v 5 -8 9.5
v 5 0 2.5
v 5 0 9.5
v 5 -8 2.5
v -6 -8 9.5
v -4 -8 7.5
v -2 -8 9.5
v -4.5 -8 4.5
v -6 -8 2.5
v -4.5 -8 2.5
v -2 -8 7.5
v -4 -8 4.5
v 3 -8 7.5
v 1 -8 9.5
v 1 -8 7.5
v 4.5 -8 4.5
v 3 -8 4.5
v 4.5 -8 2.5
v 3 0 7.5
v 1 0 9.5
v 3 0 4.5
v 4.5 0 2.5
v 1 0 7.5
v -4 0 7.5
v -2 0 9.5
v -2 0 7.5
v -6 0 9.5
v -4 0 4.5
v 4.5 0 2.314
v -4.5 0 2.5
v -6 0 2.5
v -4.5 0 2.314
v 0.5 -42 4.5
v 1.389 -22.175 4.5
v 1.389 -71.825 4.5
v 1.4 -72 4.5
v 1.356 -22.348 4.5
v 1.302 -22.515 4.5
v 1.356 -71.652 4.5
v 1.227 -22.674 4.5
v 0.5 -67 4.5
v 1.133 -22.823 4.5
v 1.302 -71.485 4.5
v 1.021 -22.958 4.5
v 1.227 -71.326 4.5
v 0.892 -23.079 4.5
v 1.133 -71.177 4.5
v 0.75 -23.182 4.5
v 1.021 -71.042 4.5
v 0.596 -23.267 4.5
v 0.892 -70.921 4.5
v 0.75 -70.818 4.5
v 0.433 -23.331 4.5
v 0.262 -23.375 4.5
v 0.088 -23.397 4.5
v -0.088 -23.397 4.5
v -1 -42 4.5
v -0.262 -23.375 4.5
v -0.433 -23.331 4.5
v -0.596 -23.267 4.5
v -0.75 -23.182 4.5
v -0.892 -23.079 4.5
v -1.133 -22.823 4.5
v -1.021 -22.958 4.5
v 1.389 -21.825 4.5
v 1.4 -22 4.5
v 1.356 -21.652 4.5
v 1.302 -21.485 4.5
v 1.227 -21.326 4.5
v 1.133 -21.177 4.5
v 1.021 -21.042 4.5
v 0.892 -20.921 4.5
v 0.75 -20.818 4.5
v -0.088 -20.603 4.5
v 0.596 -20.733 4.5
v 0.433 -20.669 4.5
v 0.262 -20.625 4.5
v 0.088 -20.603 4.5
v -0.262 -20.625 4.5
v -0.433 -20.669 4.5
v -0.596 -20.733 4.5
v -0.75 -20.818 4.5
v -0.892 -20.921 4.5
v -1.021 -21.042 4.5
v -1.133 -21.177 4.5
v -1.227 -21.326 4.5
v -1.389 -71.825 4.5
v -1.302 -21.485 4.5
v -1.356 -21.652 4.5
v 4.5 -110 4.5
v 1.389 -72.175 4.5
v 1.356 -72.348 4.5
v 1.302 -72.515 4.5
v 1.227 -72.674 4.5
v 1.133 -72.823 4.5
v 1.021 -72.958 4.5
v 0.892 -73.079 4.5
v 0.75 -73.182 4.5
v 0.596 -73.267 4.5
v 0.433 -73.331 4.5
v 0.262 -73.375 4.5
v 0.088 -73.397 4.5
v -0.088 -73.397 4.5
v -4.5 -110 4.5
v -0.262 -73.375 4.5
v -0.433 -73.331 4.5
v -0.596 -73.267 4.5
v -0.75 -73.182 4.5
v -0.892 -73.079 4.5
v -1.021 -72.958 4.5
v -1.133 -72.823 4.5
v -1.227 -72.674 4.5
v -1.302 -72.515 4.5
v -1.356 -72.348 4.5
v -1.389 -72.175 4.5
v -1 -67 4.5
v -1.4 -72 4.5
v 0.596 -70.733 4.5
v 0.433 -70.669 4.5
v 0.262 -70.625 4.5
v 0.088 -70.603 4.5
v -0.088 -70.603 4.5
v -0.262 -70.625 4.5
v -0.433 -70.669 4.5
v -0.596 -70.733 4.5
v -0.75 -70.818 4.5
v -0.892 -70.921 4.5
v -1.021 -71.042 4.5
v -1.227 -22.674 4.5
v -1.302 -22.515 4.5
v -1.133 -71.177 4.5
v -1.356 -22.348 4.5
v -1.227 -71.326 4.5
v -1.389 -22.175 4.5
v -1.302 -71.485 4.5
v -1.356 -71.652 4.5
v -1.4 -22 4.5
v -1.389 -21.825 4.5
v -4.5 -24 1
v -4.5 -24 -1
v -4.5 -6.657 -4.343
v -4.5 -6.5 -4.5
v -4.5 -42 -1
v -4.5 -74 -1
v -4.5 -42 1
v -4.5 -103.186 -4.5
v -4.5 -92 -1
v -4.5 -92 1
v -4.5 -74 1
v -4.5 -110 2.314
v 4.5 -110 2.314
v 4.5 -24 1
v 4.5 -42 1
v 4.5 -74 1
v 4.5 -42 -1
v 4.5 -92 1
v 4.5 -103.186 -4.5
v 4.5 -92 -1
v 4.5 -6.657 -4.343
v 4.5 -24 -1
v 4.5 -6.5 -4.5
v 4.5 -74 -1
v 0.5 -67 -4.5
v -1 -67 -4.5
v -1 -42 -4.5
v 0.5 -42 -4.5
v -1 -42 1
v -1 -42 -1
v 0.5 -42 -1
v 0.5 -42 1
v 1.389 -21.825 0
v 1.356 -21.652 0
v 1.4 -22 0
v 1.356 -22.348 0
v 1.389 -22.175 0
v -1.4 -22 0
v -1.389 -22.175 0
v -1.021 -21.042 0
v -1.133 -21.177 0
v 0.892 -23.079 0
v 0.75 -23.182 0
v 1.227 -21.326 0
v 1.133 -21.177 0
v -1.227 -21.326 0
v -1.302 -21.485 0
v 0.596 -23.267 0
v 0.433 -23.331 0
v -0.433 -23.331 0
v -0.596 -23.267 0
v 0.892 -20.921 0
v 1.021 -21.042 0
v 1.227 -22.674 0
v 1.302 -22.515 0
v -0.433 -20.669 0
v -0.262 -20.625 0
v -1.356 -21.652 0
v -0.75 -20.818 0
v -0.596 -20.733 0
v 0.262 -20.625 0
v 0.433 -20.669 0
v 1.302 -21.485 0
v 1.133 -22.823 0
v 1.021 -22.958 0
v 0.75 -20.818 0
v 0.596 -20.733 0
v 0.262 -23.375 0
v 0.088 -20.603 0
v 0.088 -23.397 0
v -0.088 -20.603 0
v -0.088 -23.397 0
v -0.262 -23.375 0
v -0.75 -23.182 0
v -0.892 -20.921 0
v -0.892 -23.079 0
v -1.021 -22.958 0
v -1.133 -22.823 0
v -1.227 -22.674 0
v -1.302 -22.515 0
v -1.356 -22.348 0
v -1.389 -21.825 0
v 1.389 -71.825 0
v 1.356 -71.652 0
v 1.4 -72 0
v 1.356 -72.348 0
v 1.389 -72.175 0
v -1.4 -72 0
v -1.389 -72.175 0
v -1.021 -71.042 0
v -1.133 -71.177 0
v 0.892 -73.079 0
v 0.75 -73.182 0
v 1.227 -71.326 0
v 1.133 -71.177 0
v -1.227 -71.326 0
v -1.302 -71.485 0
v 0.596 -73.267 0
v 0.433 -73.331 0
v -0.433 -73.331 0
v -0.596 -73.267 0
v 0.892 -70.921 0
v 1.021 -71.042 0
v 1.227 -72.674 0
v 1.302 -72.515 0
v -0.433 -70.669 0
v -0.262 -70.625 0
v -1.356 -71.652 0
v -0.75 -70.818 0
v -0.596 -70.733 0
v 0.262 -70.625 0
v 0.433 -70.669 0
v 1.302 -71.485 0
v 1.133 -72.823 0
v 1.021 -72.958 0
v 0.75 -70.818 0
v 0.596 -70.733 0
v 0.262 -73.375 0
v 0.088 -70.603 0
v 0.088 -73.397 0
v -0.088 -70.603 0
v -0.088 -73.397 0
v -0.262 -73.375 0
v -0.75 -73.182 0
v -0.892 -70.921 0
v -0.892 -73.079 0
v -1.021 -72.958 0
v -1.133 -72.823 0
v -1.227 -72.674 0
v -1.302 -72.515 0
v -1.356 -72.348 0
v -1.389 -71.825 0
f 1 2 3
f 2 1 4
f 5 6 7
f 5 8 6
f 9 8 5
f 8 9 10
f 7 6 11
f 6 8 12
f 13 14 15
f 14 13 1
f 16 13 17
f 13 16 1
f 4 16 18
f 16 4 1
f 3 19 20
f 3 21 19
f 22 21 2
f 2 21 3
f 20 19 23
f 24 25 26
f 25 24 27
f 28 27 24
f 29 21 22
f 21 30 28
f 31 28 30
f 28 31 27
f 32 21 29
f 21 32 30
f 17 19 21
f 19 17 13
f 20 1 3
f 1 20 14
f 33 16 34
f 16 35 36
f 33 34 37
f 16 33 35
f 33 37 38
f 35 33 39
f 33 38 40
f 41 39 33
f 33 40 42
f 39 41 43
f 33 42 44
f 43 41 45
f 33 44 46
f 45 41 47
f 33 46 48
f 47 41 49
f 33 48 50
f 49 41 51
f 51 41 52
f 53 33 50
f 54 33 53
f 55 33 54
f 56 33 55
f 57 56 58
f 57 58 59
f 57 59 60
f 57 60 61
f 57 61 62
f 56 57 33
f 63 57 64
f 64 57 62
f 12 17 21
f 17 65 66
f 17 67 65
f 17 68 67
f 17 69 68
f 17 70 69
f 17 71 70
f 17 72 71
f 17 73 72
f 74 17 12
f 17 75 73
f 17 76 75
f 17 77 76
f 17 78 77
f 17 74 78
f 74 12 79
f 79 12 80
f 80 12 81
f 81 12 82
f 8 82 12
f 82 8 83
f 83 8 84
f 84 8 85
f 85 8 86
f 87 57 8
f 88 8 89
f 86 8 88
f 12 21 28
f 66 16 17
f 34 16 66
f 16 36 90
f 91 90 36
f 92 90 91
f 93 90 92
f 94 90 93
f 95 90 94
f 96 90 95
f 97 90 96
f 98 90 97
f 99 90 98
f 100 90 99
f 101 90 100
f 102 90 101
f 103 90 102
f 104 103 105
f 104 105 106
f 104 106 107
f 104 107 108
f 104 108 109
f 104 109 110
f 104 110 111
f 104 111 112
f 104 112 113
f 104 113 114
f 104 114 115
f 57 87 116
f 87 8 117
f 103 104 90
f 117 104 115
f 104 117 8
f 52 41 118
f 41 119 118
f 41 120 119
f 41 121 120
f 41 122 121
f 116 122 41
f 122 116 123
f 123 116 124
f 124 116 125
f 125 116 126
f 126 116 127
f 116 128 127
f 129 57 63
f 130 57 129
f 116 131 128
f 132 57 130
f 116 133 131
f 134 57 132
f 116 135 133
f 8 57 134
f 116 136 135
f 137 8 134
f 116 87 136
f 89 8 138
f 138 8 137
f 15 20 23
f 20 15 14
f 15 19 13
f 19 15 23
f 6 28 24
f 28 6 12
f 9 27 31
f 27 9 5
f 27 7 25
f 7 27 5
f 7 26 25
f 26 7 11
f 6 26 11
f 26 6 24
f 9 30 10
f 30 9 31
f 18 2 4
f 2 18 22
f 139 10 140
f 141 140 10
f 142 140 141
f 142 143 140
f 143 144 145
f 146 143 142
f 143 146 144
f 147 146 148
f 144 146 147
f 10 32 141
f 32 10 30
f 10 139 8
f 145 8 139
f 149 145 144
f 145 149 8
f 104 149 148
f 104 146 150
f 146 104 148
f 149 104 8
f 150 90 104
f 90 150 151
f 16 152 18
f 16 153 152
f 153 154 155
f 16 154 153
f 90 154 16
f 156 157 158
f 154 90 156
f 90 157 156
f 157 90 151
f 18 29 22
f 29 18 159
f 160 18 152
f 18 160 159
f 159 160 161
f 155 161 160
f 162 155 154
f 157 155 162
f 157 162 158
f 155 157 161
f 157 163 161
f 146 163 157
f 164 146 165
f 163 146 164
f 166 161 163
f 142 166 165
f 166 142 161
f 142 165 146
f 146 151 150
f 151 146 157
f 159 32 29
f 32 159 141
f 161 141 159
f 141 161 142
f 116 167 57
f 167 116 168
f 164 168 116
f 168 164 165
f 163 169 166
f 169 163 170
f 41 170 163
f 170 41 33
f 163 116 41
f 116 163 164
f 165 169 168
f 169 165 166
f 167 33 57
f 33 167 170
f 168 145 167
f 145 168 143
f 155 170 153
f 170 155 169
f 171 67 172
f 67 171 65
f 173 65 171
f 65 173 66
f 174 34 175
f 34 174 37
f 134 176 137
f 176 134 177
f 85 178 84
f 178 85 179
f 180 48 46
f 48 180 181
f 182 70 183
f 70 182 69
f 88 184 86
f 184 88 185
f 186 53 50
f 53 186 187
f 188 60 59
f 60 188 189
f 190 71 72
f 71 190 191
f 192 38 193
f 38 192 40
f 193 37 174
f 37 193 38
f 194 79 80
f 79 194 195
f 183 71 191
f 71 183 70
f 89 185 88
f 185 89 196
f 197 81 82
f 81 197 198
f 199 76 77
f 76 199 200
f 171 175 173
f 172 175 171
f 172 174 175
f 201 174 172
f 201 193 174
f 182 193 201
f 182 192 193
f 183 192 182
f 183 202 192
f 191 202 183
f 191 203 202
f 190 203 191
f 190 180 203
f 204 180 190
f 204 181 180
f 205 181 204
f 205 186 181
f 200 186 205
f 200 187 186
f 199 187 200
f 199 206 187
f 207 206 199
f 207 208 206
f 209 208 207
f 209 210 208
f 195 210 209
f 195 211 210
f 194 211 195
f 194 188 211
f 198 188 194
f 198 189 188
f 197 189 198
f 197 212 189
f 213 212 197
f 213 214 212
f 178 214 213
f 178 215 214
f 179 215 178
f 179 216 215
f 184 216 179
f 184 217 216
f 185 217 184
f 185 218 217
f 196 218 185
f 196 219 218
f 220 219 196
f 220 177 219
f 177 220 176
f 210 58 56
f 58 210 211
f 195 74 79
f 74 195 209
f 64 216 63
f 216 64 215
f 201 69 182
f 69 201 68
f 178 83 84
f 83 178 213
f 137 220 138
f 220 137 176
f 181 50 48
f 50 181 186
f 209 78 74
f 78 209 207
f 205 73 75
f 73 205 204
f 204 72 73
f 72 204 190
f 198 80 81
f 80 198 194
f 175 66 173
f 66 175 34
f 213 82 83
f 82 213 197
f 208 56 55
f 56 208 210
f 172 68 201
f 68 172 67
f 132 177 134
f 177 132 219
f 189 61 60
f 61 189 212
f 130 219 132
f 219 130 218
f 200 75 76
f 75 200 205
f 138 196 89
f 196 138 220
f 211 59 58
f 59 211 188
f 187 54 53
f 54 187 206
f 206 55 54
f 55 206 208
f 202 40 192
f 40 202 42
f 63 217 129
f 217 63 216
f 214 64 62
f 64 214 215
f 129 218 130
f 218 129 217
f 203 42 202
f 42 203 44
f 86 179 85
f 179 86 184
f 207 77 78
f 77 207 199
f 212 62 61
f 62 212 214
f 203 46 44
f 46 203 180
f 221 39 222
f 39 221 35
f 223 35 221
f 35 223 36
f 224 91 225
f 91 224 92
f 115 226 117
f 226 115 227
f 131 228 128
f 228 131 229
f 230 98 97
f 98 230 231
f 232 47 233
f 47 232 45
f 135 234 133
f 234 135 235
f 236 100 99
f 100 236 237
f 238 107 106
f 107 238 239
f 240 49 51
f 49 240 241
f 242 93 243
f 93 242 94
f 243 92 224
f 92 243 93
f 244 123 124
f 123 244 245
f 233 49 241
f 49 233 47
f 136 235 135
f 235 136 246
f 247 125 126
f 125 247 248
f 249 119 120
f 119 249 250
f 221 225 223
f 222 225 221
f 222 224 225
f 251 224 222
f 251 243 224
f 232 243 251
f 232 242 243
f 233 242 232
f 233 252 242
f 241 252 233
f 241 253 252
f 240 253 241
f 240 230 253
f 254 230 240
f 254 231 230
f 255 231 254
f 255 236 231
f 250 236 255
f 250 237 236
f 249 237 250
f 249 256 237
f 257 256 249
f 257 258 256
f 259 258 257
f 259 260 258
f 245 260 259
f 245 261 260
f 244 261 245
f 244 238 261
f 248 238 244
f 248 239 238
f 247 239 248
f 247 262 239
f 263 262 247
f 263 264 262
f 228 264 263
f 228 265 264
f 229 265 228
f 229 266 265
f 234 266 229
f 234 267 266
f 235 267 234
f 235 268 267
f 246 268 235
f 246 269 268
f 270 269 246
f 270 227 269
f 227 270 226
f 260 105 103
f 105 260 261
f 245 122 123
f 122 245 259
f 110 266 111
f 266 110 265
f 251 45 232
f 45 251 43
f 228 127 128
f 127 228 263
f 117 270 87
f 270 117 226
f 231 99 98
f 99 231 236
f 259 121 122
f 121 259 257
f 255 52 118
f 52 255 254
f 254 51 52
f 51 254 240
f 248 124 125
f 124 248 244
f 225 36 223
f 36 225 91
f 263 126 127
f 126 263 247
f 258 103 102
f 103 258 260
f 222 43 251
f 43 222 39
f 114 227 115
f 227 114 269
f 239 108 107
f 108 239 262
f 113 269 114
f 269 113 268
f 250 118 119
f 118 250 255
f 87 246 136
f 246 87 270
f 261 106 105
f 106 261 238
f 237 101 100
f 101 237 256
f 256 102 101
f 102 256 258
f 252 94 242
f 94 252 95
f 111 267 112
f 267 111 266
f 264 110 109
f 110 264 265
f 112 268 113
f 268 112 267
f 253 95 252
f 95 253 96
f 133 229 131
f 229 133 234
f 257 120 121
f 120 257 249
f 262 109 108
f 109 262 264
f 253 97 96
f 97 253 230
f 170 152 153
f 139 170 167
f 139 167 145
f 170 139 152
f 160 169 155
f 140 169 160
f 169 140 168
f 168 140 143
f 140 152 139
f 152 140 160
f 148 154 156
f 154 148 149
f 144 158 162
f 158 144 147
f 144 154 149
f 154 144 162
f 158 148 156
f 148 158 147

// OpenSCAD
$fn=50;

KEEL_W=9.0;
KEEL_H=9.0;
KEEL_L=110;

difference() {
    union() {
        // measuring posts
        //translate([0,  MOUNT_HOLE_OFFSET+15, 0]) cylinder(h=7, d=1.0);            
        //translate([0, MOUNT_HOLE_OFFSET+30, 0]) cylinder(h=7, d=1.0);
        
        // keel
        rotate([90,0,0])
        linear_extrude(KEEL_L) square([KEEL_W, KEEL_H], center=true); 
        // cable clamp
        translate([1, 0, 4.5])
        rotate([90, 0, 0])
        union(){
            // Vertical arm of the C-clamp 2
            translate([2.0, 0, 0]) cube([2, 5, 8]);
            // Horizontal arm of the C-clamp
            rotate([90, 0, 0])
            translate([0, 0, -5]) cube([2, 8, 2]);
            // Vertical arm of the C-clamp 1
            translate([-7, 0, 0]) cube([2, 5, 8]);
            // Horizontal arm of the C-clamp
            rotate([90, 0, 0])
            translate([-5.0, 0,-5]) cube([2, 8, 2]);
            // clamp bed
            rotate([90, 0, 0])
            translate([-7.0, 0,-0]) cube([11, 8, 2]);
        }
    }
    
    // front of keel slope
    translate([-5, -KEEL_L-6, -3])
    rotate([-45, 0, 0])
    //(x, z, y)
    cube([10, 11, 8]); 
    
    // rear of keel slope
    translate([-5, -1, -10])
    rotate([45, 0, 0])
    //(x, z, y)
    #cube([10, 11, 8]);  
 
    //center cutout - vent
    translate([-1.0, -42.0, -5.0])
    rotate([90,0,0])
    //y, z, x
    cube([1.5, 10, 25]);
    
    // screw holes
    translate([0, -22, 0]) cylinder(h=5, d=2.8); 
    translate([0.0, -72, 0]) cylinder(h=5, d=2.8);   

    // thru slots for straps
    translate([-7.0, -42,-1]) cube([14, 18, 2]);       
    translate([-7.0, -92,-1]) cube([14, 18, 2]);
}
